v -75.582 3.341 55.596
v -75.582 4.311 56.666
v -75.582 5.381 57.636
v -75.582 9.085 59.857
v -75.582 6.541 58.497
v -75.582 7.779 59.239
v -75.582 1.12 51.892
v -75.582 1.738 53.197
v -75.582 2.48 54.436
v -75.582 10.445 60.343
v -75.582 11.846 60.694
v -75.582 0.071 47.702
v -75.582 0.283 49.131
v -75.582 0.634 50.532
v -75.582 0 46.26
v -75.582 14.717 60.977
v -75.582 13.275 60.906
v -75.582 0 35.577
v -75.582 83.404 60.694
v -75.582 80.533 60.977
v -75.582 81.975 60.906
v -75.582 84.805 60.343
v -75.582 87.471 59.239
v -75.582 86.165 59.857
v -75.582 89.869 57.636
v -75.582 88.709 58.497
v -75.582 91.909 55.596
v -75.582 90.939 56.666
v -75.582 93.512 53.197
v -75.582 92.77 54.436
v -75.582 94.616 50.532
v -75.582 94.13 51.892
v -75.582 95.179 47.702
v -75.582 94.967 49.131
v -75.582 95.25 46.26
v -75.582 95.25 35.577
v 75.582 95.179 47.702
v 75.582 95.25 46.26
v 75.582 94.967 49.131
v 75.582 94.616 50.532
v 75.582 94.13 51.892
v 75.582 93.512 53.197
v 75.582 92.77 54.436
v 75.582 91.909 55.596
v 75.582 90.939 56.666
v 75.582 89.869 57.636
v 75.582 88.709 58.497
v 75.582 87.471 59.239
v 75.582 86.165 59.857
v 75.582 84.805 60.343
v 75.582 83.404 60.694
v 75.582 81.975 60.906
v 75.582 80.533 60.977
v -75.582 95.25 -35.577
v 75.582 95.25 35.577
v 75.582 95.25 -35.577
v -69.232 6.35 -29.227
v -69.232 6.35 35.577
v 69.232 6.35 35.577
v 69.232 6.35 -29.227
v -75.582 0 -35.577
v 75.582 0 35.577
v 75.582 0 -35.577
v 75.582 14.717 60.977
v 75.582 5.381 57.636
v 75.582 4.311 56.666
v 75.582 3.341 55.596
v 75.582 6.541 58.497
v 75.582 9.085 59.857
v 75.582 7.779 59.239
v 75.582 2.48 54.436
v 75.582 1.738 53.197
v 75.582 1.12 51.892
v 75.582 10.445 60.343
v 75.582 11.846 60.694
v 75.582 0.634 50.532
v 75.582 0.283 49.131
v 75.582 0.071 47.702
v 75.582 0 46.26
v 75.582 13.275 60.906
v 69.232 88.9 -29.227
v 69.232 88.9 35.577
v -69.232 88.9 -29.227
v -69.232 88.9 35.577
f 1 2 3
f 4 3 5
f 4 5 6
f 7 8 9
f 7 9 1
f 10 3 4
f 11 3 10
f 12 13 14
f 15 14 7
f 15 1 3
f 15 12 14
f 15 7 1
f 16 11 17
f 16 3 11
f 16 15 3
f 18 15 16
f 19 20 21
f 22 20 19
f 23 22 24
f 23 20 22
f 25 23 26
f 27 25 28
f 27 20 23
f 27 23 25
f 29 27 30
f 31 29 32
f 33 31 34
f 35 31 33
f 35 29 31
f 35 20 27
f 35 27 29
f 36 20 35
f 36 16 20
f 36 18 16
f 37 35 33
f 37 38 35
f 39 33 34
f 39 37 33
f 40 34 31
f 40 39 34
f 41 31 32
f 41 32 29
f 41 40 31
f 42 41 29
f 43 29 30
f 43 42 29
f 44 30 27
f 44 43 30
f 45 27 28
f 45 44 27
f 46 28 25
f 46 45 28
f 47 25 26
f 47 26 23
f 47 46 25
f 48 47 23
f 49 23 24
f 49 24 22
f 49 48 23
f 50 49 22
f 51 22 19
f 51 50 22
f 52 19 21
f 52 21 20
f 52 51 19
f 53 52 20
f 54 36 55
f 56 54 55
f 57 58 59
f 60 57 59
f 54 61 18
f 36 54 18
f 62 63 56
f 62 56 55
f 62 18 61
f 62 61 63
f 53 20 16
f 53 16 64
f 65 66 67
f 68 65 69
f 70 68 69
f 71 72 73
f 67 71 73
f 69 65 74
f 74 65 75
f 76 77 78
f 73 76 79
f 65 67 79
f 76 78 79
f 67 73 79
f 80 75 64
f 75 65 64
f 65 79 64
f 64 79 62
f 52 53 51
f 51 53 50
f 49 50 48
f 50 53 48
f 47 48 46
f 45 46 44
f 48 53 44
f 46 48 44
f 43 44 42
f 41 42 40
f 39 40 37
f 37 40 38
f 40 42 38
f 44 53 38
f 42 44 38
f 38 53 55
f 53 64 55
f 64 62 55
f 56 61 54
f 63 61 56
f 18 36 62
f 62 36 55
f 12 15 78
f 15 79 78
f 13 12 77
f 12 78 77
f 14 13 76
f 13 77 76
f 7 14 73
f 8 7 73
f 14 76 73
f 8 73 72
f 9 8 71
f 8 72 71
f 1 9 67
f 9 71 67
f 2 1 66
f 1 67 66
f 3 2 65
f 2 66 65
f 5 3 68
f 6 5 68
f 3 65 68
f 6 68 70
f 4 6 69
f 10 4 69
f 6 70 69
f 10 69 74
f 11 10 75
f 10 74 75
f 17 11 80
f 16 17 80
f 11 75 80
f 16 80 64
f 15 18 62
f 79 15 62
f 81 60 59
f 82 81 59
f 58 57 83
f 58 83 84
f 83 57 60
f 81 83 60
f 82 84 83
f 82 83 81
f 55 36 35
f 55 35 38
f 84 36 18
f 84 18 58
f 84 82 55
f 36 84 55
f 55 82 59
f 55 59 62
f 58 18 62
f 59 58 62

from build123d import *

# Parameters (mm, degrees)
F0_W     = 151.163936
F0_H     = 71.153932
F1_DEPTH = 95.25
F2_W     = 151.163936
F2_H     = 95.25
F3_DEPTH = 25.4
F4_R     = 14.717046
F5_T     = -6.35


with BuildPart() as f1:
    # F0 (on Front) → F1 (new body)
    with BuildSketch(Plane.XZ):
        Rectangle(F0_W, F0_H)
    extrude(amount=-F1_DEPTH)

    # F5
    f5_openings = [f1.faces().sort_by_distance(p)[0] for p in [
        (0, 47.625, 35.576966),
    ]]
    offset(amount=F5_T, openings=f5_openings)


with BuildPart() as f3:
    # F2 (on face) → F3 (new body)
    with BuildSketch(Plane.XY.offset(35.576966)):
        with Locations((0, 47.625)):
            Rectangle(F2_W, F2_H)
    extrude(amount=F3_DEPTH)

    # F4
    f4_edges = [f3.edges().sort_by_distance(p)[0] for p in [
        (0, 0, 60.976966),
        (0, 95.25, 60.976966),
    ]]
    fillet(f4_edges, radius=F4_R)


solid = Compound([f1.part, f3.part])
